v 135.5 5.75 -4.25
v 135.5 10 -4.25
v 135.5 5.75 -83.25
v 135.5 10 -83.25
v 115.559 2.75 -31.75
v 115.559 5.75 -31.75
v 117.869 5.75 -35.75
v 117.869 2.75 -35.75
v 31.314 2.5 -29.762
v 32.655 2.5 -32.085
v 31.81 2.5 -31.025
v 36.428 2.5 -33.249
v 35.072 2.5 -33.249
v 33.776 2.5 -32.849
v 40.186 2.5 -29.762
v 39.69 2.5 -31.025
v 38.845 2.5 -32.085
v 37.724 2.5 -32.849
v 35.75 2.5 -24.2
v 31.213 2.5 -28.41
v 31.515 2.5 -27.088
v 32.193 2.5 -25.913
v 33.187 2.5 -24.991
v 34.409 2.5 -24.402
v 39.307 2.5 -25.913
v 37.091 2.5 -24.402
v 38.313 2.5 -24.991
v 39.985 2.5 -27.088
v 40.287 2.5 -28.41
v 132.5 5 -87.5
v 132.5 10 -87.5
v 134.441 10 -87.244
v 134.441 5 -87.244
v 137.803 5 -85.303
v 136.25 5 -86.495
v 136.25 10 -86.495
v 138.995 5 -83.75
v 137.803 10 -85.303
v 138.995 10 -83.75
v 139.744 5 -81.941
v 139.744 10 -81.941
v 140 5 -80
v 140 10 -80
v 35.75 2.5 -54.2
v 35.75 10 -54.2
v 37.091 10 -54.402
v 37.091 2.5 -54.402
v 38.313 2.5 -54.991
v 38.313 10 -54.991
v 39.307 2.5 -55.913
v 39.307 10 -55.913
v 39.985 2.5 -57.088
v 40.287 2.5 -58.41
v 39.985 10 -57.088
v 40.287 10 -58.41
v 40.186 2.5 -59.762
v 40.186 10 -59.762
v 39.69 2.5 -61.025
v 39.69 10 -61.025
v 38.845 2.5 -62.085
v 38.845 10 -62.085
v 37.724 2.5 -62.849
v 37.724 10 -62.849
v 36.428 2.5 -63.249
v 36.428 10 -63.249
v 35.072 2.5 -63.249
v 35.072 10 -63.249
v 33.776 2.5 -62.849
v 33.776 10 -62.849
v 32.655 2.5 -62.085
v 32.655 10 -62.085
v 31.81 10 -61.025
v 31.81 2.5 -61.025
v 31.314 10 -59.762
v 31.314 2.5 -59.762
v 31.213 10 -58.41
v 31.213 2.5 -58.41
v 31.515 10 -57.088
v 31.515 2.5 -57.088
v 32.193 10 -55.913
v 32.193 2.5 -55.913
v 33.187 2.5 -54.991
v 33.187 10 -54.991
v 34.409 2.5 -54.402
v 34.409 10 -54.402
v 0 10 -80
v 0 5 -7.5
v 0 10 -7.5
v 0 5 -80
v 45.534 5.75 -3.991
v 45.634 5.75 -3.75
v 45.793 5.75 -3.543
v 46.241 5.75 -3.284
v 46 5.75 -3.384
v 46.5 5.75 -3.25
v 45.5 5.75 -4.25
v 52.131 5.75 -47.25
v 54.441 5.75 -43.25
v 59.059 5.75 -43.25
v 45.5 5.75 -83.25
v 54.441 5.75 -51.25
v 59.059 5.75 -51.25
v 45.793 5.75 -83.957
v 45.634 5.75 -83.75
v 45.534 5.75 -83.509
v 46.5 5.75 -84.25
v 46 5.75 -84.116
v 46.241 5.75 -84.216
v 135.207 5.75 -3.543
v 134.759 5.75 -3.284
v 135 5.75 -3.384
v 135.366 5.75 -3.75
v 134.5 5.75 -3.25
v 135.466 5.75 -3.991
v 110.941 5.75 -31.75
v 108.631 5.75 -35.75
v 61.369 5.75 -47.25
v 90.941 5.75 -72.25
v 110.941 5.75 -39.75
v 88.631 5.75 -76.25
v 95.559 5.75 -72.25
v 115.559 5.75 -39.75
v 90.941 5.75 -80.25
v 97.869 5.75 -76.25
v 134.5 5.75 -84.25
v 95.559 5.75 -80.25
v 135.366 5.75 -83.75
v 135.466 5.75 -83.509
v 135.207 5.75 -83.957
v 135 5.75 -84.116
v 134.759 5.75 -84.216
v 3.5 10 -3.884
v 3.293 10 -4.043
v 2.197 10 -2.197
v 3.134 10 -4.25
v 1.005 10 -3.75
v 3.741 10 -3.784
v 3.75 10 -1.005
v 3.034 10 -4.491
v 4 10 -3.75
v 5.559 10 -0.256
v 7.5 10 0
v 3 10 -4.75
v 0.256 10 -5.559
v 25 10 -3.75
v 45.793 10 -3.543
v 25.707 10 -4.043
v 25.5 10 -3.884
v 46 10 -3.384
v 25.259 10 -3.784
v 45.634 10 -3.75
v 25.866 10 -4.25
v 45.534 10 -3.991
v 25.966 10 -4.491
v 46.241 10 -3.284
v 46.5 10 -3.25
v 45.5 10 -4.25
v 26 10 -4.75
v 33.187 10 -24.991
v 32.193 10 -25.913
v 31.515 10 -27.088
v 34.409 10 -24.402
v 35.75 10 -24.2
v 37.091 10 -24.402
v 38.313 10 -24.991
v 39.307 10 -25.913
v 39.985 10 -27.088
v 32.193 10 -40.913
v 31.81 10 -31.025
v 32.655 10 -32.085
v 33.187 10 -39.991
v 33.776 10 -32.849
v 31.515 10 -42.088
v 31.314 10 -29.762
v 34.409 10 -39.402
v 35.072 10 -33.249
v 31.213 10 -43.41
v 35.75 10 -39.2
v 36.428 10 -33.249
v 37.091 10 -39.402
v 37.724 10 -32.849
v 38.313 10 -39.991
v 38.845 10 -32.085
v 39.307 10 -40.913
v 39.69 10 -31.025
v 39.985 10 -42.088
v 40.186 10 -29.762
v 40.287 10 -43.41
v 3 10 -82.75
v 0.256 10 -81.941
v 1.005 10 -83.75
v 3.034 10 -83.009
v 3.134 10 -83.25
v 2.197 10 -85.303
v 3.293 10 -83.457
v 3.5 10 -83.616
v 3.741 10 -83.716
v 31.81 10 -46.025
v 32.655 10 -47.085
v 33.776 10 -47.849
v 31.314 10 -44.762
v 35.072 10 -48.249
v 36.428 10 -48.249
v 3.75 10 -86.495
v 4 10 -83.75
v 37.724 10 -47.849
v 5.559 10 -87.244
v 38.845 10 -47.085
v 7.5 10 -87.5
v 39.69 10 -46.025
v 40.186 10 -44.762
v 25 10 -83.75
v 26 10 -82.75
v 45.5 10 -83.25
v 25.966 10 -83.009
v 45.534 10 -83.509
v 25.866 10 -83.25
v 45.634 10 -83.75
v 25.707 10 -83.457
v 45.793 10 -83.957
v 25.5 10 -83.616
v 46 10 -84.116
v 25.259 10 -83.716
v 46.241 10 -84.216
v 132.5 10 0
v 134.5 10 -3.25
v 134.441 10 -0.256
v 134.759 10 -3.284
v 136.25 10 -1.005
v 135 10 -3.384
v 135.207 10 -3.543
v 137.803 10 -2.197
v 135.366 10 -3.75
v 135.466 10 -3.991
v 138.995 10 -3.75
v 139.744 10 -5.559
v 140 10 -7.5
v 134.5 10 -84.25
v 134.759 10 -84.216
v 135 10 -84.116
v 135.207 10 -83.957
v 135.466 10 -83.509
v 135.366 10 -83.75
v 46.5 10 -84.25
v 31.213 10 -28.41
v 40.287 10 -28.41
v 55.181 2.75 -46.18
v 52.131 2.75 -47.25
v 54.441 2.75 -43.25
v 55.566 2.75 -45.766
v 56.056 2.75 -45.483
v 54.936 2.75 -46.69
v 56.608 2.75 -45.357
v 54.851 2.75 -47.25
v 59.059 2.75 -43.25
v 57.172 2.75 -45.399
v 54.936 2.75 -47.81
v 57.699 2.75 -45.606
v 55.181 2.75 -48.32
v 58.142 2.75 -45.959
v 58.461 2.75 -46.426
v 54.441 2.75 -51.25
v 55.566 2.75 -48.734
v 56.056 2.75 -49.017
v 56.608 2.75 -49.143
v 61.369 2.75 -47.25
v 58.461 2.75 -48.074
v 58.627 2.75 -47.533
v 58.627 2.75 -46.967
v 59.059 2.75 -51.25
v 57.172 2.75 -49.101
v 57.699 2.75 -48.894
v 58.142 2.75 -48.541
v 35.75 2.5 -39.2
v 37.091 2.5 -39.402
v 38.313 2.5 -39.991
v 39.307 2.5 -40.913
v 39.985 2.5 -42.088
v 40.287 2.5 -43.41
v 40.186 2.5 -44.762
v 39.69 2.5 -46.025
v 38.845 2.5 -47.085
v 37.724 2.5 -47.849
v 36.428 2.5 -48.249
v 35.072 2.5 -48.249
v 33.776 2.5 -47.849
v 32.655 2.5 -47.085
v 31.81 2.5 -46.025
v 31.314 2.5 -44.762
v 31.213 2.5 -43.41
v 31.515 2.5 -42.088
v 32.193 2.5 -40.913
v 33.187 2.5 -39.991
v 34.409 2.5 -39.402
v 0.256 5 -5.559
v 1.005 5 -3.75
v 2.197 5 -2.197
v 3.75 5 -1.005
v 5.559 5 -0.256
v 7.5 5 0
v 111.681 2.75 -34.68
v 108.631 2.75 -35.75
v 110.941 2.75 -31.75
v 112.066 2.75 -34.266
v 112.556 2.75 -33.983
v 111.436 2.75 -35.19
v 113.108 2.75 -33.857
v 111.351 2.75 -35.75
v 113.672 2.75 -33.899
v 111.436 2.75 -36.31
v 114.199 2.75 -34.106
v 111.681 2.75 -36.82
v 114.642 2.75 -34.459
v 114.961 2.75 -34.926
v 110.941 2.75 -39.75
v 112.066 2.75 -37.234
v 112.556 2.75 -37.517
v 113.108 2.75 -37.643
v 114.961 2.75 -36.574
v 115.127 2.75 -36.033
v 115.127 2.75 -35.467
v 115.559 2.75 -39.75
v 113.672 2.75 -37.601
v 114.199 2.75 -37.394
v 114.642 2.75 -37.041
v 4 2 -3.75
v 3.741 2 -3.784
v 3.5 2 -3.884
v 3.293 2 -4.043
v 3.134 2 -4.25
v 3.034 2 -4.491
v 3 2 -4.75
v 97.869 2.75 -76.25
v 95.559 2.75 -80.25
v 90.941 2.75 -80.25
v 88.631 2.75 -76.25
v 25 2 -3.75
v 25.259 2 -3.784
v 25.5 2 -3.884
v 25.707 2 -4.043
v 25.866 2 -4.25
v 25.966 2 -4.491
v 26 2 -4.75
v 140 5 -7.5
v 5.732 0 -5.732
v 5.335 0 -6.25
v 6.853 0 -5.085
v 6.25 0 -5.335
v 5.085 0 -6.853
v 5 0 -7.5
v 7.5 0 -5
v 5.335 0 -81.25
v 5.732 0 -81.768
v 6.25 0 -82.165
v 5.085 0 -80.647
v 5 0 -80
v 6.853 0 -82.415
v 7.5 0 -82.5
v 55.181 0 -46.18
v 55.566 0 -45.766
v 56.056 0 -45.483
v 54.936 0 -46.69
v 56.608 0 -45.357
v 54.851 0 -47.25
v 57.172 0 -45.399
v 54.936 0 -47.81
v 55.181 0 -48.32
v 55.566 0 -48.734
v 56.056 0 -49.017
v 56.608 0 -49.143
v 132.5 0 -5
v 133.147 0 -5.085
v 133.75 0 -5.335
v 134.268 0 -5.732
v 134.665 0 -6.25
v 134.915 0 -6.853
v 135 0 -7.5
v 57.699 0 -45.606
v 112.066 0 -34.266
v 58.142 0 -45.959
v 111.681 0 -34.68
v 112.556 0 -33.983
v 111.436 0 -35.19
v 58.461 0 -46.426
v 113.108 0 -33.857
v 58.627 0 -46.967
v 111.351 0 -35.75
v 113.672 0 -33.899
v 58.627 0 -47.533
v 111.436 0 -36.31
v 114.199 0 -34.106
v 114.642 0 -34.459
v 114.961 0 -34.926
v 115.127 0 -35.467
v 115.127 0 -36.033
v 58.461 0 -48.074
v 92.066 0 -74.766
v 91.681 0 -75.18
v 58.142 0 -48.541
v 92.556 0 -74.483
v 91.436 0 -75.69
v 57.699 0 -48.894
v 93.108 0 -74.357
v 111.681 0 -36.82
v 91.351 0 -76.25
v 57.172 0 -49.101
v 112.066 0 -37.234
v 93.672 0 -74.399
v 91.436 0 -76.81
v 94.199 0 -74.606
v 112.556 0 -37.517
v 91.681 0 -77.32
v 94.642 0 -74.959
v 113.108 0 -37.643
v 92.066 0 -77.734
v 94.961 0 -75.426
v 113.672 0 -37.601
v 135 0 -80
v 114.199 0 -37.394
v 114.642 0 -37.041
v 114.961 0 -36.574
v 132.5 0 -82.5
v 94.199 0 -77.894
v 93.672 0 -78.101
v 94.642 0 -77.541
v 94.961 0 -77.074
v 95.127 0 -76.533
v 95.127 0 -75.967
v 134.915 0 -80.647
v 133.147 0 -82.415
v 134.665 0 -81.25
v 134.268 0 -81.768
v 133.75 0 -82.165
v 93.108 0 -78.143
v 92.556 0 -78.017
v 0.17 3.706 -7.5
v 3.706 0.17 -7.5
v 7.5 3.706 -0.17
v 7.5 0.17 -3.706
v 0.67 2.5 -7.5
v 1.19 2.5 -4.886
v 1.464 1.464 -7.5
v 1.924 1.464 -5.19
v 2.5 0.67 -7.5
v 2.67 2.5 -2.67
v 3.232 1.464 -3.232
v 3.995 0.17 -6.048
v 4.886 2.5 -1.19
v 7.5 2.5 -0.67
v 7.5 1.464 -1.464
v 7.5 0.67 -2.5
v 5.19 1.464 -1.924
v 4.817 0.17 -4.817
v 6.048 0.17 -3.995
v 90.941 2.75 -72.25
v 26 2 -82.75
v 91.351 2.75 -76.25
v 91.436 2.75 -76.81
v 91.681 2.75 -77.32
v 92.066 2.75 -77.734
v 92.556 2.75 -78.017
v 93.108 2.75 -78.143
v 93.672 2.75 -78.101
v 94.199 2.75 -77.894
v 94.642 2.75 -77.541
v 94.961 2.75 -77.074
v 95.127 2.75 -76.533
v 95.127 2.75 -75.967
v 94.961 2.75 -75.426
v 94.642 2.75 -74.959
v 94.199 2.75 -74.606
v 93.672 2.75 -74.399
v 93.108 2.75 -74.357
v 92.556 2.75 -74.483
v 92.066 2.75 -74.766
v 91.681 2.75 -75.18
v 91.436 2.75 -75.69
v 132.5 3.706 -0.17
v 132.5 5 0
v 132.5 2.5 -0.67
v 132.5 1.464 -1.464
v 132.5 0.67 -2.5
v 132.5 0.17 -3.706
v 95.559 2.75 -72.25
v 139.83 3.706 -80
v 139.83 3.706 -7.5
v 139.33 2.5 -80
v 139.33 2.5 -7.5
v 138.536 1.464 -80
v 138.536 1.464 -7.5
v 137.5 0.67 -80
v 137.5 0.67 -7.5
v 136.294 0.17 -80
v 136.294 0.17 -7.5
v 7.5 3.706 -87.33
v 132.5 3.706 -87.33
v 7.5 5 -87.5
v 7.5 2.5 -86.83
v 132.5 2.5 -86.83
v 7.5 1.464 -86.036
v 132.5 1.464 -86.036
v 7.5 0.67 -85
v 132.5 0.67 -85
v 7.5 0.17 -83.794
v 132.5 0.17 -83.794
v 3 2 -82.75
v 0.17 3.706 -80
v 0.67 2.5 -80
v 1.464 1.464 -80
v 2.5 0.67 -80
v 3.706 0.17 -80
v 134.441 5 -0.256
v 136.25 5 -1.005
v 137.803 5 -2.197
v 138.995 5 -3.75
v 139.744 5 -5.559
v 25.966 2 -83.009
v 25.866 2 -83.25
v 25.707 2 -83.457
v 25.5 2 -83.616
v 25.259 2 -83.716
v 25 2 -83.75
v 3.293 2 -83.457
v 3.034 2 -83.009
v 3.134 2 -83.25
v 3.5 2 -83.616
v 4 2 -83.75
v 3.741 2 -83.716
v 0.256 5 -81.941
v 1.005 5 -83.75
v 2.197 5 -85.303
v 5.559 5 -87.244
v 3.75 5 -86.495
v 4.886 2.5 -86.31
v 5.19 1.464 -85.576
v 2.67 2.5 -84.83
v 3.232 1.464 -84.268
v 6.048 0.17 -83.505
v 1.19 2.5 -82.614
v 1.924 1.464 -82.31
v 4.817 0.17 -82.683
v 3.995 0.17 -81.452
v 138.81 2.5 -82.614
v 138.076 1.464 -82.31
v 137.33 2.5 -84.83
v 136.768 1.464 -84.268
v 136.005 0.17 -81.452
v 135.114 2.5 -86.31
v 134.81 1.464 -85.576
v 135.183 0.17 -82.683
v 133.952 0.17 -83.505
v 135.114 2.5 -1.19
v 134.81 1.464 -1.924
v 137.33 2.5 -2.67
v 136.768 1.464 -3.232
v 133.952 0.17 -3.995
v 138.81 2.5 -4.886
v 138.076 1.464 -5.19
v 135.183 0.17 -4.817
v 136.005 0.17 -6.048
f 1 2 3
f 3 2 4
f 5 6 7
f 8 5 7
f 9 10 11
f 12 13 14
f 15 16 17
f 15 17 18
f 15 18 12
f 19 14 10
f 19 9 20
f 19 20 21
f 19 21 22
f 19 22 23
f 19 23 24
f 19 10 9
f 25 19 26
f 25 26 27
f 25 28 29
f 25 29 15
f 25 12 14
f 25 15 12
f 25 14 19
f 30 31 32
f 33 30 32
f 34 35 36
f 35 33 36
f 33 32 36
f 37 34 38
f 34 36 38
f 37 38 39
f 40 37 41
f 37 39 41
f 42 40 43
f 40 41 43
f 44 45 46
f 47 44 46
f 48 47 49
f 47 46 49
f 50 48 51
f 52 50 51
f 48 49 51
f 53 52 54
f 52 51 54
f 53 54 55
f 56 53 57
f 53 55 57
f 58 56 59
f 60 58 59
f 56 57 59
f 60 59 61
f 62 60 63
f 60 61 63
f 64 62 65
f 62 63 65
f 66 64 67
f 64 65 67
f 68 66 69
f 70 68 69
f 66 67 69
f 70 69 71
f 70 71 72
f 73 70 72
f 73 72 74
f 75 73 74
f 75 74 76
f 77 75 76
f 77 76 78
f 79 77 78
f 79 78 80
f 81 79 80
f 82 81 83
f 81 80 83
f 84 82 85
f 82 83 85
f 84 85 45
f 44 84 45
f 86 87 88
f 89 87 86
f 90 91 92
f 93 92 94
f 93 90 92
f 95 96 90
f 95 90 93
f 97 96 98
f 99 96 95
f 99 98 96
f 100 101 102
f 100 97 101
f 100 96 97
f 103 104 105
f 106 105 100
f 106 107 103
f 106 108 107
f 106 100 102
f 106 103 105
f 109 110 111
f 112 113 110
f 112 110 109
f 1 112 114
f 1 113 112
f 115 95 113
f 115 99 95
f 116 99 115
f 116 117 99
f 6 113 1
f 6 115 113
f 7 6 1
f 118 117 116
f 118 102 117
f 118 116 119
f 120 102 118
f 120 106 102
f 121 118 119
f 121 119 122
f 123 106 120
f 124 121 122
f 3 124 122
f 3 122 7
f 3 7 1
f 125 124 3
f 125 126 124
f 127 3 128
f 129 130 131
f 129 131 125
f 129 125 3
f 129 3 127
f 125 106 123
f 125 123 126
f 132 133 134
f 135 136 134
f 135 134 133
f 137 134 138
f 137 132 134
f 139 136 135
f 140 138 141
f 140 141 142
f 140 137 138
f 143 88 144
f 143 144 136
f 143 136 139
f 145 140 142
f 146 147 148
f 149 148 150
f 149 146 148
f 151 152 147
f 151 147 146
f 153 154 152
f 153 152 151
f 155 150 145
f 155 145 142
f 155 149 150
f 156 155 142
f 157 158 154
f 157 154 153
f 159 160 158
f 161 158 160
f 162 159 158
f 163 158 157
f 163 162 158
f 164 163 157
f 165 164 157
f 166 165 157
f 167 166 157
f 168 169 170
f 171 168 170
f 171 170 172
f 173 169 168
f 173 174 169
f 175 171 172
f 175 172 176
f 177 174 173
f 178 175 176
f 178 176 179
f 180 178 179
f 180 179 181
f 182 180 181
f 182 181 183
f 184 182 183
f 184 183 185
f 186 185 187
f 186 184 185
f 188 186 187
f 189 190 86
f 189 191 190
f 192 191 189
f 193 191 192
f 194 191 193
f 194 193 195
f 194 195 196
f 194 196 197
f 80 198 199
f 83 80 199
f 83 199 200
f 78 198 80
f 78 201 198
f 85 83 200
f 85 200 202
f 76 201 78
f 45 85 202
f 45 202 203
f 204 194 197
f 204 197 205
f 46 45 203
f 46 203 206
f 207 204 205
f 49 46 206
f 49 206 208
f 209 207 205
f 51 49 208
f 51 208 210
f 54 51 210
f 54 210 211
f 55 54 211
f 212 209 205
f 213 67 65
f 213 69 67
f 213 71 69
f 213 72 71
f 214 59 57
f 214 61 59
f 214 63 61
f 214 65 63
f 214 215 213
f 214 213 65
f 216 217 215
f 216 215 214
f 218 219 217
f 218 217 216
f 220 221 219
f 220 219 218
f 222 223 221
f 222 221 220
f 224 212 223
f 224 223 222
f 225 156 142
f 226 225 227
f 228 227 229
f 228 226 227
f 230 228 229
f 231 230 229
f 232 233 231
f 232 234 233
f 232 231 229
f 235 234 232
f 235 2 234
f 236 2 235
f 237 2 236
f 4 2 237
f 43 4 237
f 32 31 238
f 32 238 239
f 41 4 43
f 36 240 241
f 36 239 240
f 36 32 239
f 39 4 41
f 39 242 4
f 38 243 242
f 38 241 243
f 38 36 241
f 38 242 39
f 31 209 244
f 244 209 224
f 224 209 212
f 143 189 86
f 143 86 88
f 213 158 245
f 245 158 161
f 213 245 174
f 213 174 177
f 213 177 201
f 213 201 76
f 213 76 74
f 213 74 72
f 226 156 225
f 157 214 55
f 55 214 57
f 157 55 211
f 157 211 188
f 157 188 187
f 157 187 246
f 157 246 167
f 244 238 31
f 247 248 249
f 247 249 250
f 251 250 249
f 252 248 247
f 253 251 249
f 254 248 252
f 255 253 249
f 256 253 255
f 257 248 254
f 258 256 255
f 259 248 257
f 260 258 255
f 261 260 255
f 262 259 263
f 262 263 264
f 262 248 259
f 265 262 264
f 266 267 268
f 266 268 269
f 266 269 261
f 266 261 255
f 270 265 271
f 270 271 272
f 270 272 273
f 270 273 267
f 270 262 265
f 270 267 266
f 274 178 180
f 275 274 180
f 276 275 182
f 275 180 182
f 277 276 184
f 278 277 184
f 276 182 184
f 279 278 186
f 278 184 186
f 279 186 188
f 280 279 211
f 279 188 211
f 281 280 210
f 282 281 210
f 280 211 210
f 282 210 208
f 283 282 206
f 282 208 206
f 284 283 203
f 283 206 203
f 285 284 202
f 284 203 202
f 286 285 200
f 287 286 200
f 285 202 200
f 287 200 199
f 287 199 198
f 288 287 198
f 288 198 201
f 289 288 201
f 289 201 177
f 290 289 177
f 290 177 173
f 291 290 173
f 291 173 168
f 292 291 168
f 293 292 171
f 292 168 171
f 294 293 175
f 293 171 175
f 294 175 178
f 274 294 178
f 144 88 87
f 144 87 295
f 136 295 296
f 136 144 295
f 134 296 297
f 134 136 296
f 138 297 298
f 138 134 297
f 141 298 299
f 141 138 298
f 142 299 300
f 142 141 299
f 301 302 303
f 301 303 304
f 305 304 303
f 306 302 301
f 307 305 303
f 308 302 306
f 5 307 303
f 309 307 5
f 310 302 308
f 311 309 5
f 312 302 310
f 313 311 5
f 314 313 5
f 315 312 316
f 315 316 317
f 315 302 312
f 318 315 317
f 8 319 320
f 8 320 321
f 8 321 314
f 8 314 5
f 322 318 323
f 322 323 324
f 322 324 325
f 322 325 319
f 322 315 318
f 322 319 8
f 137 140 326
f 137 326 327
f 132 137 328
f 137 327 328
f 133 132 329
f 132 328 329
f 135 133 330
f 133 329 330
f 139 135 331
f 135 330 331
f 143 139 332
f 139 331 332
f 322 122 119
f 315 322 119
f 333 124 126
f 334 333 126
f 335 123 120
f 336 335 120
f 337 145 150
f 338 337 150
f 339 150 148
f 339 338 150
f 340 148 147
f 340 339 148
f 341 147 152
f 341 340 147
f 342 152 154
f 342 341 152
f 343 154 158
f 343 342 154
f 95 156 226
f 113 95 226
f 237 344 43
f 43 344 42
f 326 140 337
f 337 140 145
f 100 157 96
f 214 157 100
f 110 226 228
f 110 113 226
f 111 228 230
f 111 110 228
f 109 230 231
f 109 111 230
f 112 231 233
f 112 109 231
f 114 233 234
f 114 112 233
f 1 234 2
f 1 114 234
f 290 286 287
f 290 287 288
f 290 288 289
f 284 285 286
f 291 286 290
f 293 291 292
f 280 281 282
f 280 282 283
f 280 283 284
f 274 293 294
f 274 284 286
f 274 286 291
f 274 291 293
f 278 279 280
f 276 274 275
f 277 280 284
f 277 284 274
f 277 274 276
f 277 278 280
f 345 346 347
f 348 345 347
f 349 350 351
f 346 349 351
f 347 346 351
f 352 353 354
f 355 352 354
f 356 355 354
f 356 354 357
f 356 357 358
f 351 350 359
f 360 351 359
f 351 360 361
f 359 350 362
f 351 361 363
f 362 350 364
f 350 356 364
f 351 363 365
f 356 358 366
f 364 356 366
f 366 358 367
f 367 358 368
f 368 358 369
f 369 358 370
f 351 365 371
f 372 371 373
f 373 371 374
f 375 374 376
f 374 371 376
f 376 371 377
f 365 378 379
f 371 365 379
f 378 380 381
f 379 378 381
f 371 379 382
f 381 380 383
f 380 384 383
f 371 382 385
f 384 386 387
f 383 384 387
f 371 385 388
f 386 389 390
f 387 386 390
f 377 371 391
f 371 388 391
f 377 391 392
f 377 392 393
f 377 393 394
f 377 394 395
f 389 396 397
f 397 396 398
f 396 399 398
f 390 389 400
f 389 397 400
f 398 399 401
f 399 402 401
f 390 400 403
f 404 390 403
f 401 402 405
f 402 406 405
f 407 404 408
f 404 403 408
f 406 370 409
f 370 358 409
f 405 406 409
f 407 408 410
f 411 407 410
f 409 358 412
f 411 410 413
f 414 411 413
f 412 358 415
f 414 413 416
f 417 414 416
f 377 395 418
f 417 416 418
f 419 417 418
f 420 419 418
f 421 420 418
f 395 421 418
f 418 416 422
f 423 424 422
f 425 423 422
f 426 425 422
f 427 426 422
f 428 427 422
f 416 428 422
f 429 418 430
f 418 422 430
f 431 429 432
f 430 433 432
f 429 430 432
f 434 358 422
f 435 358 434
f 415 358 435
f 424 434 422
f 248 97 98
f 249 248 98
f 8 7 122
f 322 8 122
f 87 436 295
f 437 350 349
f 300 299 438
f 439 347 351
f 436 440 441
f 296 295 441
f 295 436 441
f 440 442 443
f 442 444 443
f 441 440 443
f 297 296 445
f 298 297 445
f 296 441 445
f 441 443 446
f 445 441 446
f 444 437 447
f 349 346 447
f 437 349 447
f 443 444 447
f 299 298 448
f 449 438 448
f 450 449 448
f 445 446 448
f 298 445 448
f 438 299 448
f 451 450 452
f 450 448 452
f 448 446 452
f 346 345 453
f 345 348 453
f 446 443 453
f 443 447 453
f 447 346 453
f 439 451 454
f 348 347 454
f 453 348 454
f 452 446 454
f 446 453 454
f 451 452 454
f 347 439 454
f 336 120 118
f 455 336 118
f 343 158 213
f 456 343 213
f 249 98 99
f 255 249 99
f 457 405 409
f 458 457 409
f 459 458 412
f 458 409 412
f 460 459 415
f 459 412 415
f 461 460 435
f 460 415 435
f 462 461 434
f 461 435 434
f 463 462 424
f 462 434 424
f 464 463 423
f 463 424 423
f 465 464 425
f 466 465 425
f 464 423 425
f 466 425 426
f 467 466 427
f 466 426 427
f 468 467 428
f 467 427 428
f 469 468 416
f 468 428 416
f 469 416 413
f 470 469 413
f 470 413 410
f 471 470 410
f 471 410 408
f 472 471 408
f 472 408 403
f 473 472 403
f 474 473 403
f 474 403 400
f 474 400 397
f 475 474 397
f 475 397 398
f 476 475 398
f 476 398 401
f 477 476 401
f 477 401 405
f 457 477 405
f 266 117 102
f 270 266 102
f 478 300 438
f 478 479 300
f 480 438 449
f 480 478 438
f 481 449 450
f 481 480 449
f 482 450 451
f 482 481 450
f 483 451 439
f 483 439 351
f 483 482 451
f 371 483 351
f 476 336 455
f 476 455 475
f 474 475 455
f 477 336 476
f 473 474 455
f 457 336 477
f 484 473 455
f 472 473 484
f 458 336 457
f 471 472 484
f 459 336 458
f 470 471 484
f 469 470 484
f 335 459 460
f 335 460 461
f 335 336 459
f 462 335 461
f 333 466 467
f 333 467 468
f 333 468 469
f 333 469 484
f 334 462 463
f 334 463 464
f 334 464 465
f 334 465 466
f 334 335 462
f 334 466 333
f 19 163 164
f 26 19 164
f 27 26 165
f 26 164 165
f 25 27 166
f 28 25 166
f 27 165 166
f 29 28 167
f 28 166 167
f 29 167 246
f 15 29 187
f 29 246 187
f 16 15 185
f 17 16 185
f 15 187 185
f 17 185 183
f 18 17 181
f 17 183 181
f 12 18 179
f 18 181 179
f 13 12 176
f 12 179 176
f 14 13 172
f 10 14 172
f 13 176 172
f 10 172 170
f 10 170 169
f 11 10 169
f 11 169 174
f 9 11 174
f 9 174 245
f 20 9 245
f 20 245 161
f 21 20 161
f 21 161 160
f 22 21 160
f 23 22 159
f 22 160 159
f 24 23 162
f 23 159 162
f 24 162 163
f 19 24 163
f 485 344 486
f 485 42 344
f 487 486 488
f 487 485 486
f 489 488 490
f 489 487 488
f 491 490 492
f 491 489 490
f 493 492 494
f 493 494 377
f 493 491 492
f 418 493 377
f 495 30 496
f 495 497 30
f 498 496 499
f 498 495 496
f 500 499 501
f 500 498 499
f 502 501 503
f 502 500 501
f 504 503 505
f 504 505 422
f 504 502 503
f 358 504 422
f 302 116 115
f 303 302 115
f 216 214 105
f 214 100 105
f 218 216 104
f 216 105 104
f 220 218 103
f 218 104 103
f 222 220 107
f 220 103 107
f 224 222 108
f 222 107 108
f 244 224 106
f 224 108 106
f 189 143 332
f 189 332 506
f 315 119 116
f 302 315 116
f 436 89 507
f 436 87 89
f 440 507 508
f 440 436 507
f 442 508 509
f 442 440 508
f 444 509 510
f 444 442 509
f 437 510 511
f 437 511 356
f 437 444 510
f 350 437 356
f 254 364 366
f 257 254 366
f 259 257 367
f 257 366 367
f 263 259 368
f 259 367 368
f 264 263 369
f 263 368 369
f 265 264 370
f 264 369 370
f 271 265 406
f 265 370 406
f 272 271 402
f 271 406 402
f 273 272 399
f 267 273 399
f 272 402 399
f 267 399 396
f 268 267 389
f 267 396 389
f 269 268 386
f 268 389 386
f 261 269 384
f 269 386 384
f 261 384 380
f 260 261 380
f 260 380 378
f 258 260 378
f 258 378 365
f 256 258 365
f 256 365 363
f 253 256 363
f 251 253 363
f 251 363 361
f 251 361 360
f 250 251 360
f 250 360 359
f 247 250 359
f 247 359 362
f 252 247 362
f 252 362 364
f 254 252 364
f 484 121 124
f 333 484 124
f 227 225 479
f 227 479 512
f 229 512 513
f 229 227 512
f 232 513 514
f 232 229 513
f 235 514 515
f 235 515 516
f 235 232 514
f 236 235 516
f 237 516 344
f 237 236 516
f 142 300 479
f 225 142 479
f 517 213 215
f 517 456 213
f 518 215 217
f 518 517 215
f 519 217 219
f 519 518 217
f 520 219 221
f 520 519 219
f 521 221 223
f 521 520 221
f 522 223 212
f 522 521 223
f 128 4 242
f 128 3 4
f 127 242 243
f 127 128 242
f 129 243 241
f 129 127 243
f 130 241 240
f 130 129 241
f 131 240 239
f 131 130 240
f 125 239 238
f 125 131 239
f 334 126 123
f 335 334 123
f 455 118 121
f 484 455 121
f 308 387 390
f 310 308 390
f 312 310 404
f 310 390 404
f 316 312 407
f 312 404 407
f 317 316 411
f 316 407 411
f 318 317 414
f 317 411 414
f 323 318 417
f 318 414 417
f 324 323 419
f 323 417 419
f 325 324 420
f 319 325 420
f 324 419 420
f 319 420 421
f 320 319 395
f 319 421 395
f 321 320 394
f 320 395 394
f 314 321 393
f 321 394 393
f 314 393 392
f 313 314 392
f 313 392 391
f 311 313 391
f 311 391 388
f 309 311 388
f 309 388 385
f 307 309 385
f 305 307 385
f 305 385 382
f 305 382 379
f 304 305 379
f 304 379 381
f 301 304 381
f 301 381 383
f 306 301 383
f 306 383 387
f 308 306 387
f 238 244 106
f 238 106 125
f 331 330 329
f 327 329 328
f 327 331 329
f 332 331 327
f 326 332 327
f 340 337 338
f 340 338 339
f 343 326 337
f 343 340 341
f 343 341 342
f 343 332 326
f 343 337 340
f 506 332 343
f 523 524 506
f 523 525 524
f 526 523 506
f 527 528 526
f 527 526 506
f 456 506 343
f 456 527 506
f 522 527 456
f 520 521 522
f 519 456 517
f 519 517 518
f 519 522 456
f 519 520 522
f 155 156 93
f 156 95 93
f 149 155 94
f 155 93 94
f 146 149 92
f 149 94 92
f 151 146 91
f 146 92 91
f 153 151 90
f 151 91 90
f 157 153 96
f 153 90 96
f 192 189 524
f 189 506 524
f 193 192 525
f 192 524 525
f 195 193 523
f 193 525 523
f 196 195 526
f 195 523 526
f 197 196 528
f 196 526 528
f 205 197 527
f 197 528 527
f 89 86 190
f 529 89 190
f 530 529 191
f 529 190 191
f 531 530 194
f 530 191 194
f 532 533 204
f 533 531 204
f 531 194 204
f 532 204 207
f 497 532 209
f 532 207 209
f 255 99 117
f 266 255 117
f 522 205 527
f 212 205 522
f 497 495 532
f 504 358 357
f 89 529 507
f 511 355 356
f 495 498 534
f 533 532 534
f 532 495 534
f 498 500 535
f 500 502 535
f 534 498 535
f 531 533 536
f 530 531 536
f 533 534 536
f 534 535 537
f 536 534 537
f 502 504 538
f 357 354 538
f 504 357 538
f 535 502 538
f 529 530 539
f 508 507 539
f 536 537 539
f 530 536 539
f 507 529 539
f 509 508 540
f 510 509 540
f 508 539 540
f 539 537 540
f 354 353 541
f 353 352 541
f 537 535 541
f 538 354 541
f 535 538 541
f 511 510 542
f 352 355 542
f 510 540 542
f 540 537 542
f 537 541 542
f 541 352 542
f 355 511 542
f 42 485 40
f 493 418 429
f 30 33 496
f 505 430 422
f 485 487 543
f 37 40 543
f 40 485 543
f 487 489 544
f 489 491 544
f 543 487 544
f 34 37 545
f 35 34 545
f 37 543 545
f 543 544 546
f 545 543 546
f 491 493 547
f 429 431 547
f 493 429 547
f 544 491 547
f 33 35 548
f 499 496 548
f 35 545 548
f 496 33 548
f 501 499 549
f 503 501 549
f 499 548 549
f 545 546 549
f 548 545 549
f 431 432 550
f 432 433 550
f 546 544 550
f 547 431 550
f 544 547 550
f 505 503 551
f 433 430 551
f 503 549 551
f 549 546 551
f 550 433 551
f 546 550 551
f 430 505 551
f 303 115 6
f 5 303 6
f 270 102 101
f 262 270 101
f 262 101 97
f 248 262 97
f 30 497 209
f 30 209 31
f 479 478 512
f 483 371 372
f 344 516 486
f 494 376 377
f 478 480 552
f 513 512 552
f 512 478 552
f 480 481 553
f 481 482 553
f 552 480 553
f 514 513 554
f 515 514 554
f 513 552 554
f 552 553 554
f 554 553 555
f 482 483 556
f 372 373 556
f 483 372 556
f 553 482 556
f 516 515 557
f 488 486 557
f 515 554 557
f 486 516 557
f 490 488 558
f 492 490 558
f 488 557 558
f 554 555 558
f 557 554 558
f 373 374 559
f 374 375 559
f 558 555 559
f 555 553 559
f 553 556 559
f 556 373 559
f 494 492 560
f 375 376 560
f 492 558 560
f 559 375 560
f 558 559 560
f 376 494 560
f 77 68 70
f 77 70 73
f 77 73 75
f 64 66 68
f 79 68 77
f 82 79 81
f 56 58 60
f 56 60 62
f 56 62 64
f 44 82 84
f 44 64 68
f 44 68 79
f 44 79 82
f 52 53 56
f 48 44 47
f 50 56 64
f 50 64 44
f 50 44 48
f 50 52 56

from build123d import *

# Parameters (mm, degrees)
SKETCH1_W             = 140
SKETCH1_H             = 87.5
BOSS_EXTRUDE1_DEPTH   = 10
SKETCH2_W             = 90
SKETCH2_H             = 81
CUT_EXTRUDE1_DEPTH    = 4.25
SKETCH5_W             = 23
SKETCH5_H             = 80
CUT_EXTRUDE2_DEPTH    = 8
F_6_CLEARANCE_HOLE1_D = 3.7973
CUT_EXTRUDE4_DEPTH    = 3
FILLET1_R             = 7.5
SKETCH15_R            = 4.55
CUT_EXTRUDE3_DEPTH    = 7.5
FILLET2_R             = 1
FILLET3_R             = 5


with BuildPart() as part:
    # Sketch1 → Boss-Extrude1 (new body)
    with BuildSketch(Plane(origin=(0, 0, 0), x_dir=(1, 0, 0), z_dir=(0, 1, 0))):
        with Locations((70, 43.75)):
            Rectangle(SKETCH1_W, SKETCH1_H)
    extrude(amount=BOSS_EXTRUDE1_DEPTH)

    # Sketch2 → Cut-Extrude1 (cut)
    with BuildSketch(Plane(origin=(0, 10, 0), x_dir=(1, 0, 0), z_dir=(0, 1, 0))):
        with Locations((90.5, 43.75)):
            Rectangle(SKETCH2_W, SKETCH2_H)
    extrude(amount=-CUT_EXTRUDE1_DEPTH, mode=Mode.SUBTRACT)

    # Sketch5 → Cut-Extrude2 (cut)
    with BuildSketch(Plane(origin=(0, 10, 0), x_dir=(1, 0, 0), z_dir=(0, 1, 0))):
        with Locations((14.5, 43.75)):
            Rectangle(SKETCH5_W, SKETCH5_H)
    extrude(amount=-CUT_EXTRUDE2_DEPTH, mode=Mode.SUBTRACT)

    # #6 Clearance Hole1 (through all)
    with Locations(Plane(origin=(0, 5.75, 0), x_dir=(1, 0, 0), z_dir=(0, 1, 0))):
        with Locations((56.75, 47.25), (93.25, 76.25), (113.25, 35.75)):
            Hole(F_6_CLEARANCE_HOLE1_D / 2)

    # Sketch19 → Cut-Extrude4 (cut)
    with BuildSketch(Plane(origin=(0, 5.75, 0), x_dir=(1, 0, 0), z_dir=(0, 1, 0))):
        Polygon((59.059401077, 51.25), (54.440598923, 51.25), (52.131197846, 47.25), (54.440598923, 43.25), (59.059401077, 43.25), (61.368802154, 47.25), align=None)
        Polygon((97.868802154, 76.25), (95.559401077, 80.25), (90.940598923, 80.25), (88.631197846, 76.25), (90.940598923, 72.25), (95.559401077, 72.25), align=None)
        Polygon((117.868802154, 35.75), (115.559401077, 39.75), (110.940598923, 39.75), (108.631197846, 35.75), (110.940598923, 31.75), (115.559401077, 31.75), align=None)
    extrude(amount=-CUT_EXTRUDE4_DEPTH, mode=Mode.SUBTRACT)

    # Fillet1
    fillet1_edges = [part.edges().sort_by_distance(p)[0] for p in [
        (0, 5, -87.5),
        (140, 5, -87.5),
        (140, 5, 0),
        (0, 5, 0),
    ]]
    fillet(fillet1_edges, radius=FILLET1_R)

    # Sketch15 → Cut-Extrude3 (cut)
    with BuildSketch(Plane(origin=(0, 10, 0), x_dir=(1, 0, 0), z_dir=(0, 1, 0))):
        with Locations(Location((35.75, 43.75, 0), (0, 0, 270))):
            Circle(SKETCH15_R)
        with Locations(Location((35.75, 58.75, 0), (0, 0, 270))):
            Circle(SKETCH15_R)
        with Locations(Location((35.75, 28.75, 0), (0, 0, 270))):
            Circle(SKETCH15_R)
    extrude(amount=-CUT_EXTRUDE3_DEPTH, mode=Mode.SUBTRACT)

    # Fillet2
    fillet2_edges = [part.edges().sort_by_distance(p)[0] for p in [
        (45.5, 7.875, -3.25),
        (45.5, 7.875, -84.25),
        (135.5, 7.875, -84.25),
        (135.5, 7.875, -3.25),
        (3, 6, -3.75),
        (3, 6, -83.75),
        (26, 6, -83.75),
        (26, 6, -3.75),
    ]]
    fillet(fillet2_edges, radius=FILLET2_R)

    # Fillet3
    fillet3_edges = [part.edges().sort_by_distance(p)[0] for p in [
        (70, 0, 0),
        (0, 0, -43.75),
        (70, 0, -87.5),
        (140, 0, -43.75),
        (137.803300859, 0, -2.196699141),
        (137.803300859, 0, -85.303300859),
        (2.196699141, 0, -85.303300859),
        (2.196699141, 0, -2.196699141),
    ]]
    fillet(fillet3_edges, radius=FILLET3_R)


solid = part.part
